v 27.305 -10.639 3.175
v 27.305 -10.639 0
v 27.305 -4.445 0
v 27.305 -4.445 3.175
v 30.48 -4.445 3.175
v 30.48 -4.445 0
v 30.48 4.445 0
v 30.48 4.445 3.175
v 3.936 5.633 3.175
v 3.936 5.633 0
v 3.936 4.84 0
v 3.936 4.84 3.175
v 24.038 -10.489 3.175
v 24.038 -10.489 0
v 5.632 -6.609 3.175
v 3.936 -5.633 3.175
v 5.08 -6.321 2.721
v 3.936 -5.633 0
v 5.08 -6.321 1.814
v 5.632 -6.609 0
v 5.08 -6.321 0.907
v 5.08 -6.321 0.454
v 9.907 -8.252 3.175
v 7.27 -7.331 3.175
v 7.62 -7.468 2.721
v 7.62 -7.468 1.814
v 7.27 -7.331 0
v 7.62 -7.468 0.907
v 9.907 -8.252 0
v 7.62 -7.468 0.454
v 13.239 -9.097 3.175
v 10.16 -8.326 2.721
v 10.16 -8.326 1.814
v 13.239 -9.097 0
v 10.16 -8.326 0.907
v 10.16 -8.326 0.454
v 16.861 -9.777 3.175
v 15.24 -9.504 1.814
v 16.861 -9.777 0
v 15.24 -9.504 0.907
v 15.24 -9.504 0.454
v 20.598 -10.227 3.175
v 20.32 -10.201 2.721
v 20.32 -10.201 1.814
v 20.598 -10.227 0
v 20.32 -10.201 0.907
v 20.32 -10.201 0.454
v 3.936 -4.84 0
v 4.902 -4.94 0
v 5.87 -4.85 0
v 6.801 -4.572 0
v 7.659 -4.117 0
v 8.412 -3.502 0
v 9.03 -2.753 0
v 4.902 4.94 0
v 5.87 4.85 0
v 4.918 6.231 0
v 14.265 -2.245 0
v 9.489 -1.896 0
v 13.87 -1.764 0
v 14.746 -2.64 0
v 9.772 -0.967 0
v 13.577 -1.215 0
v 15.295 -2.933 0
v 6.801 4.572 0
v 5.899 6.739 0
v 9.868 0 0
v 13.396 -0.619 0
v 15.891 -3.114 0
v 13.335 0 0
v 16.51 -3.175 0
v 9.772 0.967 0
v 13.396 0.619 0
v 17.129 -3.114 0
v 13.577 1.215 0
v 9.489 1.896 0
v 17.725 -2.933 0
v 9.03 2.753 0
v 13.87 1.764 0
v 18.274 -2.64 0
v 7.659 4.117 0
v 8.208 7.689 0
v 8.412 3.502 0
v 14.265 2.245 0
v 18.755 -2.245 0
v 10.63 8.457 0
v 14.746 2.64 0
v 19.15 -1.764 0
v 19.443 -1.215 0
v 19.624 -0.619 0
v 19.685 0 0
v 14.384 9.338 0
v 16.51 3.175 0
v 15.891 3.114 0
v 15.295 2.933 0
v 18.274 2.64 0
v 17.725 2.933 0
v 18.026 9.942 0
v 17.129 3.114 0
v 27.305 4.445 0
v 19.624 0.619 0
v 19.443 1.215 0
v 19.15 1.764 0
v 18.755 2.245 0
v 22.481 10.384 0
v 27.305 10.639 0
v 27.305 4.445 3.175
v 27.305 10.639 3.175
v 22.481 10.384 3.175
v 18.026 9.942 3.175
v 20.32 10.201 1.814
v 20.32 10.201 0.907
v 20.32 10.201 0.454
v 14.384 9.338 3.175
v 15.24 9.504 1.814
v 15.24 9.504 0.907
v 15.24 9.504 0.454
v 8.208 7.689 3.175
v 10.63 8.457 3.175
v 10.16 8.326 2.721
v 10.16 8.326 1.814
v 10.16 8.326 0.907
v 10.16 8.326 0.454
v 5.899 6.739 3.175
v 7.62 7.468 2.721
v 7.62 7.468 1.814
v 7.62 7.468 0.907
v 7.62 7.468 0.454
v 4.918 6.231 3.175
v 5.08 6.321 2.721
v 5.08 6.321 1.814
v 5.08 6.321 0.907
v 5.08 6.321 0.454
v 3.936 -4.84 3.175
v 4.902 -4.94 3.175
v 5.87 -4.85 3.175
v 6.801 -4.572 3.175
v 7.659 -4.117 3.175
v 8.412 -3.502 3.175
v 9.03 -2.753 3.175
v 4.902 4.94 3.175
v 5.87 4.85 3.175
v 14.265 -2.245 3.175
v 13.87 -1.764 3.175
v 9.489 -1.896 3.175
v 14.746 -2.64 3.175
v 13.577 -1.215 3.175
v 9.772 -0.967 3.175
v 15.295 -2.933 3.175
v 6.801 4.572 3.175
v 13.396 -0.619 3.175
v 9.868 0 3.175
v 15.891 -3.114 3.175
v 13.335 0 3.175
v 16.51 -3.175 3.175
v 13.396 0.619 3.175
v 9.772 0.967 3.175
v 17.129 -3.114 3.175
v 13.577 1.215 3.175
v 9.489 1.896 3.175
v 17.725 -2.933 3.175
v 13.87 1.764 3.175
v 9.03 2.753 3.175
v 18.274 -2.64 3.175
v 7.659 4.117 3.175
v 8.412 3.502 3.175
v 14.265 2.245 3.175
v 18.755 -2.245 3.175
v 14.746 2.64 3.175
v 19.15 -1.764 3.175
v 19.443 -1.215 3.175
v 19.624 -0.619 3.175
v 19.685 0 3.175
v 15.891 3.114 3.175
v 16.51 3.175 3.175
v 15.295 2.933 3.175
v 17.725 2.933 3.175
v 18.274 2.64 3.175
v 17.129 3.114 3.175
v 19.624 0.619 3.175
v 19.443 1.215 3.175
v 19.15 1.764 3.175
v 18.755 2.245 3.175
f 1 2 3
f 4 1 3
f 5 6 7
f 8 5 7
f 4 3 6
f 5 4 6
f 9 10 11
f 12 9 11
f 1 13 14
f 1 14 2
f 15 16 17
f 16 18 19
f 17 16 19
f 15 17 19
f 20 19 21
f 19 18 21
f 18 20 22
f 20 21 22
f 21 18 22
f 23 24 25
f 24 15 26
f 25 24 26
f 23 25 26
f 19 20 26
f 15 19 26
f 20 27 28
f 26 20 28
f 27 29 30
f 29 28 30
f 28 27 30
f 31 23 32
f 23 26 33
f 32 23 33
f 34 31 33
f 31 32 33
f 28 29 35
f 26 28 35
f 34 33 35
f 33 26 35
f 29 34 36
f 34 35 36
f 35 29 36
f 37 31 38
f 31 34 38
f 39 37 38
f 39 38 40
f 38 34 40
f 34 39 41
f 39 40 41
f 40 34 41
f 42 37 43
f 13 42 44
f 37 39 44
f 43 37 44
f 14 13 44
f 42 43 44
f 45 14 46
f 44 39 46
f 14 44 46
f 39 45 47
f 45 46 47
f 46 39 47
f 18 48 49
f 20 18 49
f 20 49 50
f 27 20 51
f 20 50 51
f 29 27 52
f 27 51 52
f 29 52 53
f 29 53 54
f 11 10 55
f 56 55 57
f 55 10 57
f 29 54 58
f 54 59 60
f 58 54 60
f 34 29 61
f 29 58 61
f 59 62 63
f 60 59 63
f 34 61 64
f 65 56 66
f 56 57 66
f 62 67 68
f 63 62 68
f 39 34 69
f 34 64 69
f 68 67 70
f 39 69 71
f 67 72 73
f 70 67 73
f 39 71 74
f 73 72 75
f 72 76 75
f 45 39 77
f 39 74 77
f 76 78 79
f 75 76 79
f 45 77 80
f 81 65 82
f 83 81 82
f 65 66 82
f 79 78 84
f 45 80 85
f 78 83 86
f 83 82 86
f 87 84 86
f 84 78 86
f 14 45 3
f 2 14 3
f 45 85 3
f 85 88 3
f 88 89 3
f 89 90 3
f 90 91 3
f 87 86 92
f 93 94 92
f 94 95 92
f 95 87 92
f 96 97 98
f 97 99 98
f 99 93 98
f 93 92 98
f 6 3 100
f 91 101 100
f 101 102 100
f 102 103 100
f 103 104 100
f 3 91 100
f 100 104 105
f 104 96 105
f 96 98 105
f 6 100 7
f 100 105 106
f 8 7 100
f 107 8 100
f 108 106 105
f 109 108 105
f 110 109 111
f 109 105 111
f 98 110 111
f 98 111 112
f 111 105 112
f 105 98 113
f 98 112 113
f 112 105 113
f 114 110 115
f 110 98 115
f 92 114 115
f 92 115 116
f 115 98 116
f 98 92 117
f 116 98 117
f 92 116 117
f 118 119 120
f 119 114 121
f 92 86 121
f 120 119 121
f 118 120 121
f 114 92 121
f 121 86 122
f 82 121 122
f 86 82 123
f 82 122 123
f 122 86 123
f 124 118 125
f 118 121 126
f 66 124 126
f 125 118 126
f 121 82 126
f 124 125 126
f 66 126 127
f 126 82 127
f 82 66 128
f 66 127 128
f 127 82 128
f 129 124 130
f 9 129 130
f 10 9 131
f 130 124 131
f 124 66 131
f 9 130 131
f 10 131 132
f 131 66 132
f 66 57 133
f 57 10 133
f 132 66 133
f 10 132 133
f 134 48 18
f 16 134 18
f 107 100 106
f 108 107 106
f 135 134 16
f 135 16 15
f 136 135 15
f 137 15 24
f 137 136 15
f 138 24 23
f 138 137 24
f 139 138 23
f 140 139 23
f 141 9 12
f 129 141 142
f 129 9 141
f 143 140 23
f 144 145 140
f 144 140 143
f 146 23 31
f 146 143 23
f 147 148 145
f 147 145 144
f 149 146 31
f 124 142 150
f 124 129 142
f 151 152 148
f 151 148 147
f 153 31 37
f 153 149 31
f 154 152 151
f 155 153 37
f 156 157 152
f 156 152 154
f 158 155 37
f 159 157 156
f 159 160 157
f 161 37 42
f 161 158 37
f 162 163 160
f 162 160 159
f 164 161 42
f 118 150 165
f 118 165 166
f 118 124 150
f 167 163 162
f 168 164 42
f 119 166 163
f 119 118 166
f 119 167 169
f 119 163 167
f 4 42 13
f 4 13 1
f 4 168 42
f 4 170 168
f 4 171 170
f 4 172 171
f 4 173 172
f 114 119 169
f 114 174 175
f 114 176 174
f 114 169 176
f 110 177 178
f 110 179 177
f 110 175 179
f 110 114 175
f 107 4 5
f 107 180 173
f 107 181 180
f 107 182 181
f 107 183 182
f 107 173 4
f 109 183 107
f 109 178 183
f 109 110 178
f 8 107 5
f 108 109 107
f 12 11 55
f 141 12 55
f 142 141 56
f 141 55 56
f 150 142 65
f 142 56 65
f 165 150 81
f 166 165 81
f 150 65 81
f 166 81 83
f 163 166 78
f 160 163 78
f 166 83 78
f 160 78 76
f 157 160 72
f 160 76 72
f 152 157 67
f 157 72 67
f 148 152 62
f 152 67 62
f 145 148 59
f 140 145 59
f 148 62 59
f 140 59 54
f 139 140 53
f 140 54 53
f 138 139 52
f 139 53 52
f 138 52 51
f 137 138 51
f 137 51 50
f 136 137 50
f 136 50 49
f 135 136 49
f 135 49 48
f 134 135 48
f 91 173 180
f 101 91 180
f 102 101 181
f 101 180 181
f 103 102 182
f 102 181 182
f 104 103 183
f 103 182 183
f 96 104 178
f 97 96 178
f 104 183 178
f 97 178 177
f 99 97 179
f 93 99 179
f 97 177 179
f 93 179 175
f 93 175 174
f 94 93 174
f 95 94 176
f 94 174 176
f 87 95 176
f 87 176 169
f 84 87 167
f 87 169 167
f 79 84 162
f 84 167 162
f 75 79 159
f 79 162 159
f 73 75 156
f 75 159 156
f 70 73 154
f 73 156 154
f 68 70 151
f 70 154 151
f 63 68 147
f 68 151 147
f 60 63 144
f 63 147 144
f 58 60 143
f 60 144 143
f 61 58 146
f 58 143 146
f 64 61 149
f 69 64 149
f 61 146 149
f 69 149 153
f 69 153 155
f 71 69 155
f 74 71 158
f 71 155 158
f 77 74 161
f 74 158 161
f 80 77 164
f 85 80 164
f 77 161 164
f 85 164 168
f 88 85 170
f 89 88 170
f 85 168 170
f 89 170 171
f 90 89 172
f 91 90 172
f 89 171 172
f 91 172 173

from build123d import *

# Parameters (mm, degrees)
F1_DEPTH      = 3.175
F2_R          = 3.175
F3_DEPTH      = 3.175
F4_W          = 1.27
F4_H          = 6.2519614453
F5_DEPTH      = 25.4
F5_DEPTH_BACK = 25.4


with BuildPart() as f1:
    # F0 (on Top) → F1 (new body)
    with BuildSketch(Plane.XY):
        with BuildLine():
            Line((27.305, 4.445), (27.305, 10.639110318))
            add(Edge.make_bspline(
                [(27.305, 10.639110318), (26.6654543063, 10.6206147569), (24.478766488, 10.5308275824), (20.2410001582, 10.2440182138), (15.3587302448, 9.6192519425), (10.1940451056, 8.4075577542), (7.6509138704, 7.5021601175), (5.5897078561, 6.6511520763), (4.3073818225, 5.8741162544), (3.9357558202, 5.633461687)],
                knots=[0.3056468503, 0.3056468503, 0.3056468503, 0.3056468503, 0.3165359722, 0.343963226, 0.3714836424, 0.3992368185, 0.4191371497, 0.4394264313, 0.4482604373, 0.4482604373, 0.4482604373, 0.4482604373], degree=3))
            Line((3.9357558202, 5.633461687), (3.9357558202, 4.839711687))
            ThreePointArc((3.9357558202, 4.839711687), (9.8679, 0), (3.9357558202, -4.839711687))
            Line((3.9357558202, -4.839711687), (3.9357558202, -5.633461687))
            add(Edge.make_bspline(
                [(3.9357558202, -5.633461687), (4.3073818225, -5.8741162544), (5.5897078561, -6.6511520763), (7.6509138704, -7.5021601175), (10.1940451056, -8.4075577542), (15.3587302448, -9.6192519425), (20.2410001582, -10.2440182138), (24.478766488, -10.5308275824), (26.6654543063, -10.6206147569), (27.305, -10.639110318)],
                knots=[0.5517395627, 0.5517395627, 0.5517395627, 0.5517395627, 0.5605735687, 0.5808628503, 0.6007631815, 0.6285163576, 0.656036774, 0.6834640278, 0.6943531497, 0.6943531497, 0.6943531497, 0.6943531497], degree=3))
            Line((27.305, -10.639110318), (27.305, -4.445))
            Line((27.305, -4.445), (30.48, -4.445))
            Line((30.48, -4.445), (30.48, 4.445))
            Line((30.48, 4.445), (27.305, 4.445))
        make_face()
    extrude(amount=F1_DEPTH)

    # F2 (on face) → F3 (cut, through all)
    with BuildSketch(Plane.XY.offset(3.175)):
        with Locations((16.51, 0)):
            Circle(F2_R)
    extrude(amount=-F3_DEPTH, mode=Mode.SUBTRACT)


with BuildPart() as f1b:
    # F0 (on Top) → F1, piece 2 (new body)
    with BuildSketch(Plane.XY):
        with BuildLine():
            add(Edge.make_bspline(
                [(1.1020531618, 3.1259807227), (0.5678867915, 2.3248543379), (-0.5678867915, 0), (0.5678867915, -2.3248543379), (1.1020531618, -3.1259807227)],
                knots=[0.4791511417, 0.4791511417, 0.4791511417, 0.4791511417, 0.5, 0.5208488583, 0.5208488583, 0.5208488583, 0.5208488583], degree=3))
            ThreePointArc((1.1020531618, 3.1259807227), (-0.0127, 0), (1.1020531618, -3.1259807227))
        make_face()
    extrude(amount=F1_DEPTH)

    # F4 (on Top) → F5 (cut, two sides)
    with BuildSketch(Plane.XY) as f5_sk:
        with Locations((0.4670531618, 0)):
            Rectangle(F4_W, F4_H)
    extrude(amount=F5_DEPTH, mode=Mode.SUBTRACT)
    extrude(f5_sk.sketch, amount=-F5_DEPTH_BACK, mode=Mode.SUBTRACT)


solid = f1.part
